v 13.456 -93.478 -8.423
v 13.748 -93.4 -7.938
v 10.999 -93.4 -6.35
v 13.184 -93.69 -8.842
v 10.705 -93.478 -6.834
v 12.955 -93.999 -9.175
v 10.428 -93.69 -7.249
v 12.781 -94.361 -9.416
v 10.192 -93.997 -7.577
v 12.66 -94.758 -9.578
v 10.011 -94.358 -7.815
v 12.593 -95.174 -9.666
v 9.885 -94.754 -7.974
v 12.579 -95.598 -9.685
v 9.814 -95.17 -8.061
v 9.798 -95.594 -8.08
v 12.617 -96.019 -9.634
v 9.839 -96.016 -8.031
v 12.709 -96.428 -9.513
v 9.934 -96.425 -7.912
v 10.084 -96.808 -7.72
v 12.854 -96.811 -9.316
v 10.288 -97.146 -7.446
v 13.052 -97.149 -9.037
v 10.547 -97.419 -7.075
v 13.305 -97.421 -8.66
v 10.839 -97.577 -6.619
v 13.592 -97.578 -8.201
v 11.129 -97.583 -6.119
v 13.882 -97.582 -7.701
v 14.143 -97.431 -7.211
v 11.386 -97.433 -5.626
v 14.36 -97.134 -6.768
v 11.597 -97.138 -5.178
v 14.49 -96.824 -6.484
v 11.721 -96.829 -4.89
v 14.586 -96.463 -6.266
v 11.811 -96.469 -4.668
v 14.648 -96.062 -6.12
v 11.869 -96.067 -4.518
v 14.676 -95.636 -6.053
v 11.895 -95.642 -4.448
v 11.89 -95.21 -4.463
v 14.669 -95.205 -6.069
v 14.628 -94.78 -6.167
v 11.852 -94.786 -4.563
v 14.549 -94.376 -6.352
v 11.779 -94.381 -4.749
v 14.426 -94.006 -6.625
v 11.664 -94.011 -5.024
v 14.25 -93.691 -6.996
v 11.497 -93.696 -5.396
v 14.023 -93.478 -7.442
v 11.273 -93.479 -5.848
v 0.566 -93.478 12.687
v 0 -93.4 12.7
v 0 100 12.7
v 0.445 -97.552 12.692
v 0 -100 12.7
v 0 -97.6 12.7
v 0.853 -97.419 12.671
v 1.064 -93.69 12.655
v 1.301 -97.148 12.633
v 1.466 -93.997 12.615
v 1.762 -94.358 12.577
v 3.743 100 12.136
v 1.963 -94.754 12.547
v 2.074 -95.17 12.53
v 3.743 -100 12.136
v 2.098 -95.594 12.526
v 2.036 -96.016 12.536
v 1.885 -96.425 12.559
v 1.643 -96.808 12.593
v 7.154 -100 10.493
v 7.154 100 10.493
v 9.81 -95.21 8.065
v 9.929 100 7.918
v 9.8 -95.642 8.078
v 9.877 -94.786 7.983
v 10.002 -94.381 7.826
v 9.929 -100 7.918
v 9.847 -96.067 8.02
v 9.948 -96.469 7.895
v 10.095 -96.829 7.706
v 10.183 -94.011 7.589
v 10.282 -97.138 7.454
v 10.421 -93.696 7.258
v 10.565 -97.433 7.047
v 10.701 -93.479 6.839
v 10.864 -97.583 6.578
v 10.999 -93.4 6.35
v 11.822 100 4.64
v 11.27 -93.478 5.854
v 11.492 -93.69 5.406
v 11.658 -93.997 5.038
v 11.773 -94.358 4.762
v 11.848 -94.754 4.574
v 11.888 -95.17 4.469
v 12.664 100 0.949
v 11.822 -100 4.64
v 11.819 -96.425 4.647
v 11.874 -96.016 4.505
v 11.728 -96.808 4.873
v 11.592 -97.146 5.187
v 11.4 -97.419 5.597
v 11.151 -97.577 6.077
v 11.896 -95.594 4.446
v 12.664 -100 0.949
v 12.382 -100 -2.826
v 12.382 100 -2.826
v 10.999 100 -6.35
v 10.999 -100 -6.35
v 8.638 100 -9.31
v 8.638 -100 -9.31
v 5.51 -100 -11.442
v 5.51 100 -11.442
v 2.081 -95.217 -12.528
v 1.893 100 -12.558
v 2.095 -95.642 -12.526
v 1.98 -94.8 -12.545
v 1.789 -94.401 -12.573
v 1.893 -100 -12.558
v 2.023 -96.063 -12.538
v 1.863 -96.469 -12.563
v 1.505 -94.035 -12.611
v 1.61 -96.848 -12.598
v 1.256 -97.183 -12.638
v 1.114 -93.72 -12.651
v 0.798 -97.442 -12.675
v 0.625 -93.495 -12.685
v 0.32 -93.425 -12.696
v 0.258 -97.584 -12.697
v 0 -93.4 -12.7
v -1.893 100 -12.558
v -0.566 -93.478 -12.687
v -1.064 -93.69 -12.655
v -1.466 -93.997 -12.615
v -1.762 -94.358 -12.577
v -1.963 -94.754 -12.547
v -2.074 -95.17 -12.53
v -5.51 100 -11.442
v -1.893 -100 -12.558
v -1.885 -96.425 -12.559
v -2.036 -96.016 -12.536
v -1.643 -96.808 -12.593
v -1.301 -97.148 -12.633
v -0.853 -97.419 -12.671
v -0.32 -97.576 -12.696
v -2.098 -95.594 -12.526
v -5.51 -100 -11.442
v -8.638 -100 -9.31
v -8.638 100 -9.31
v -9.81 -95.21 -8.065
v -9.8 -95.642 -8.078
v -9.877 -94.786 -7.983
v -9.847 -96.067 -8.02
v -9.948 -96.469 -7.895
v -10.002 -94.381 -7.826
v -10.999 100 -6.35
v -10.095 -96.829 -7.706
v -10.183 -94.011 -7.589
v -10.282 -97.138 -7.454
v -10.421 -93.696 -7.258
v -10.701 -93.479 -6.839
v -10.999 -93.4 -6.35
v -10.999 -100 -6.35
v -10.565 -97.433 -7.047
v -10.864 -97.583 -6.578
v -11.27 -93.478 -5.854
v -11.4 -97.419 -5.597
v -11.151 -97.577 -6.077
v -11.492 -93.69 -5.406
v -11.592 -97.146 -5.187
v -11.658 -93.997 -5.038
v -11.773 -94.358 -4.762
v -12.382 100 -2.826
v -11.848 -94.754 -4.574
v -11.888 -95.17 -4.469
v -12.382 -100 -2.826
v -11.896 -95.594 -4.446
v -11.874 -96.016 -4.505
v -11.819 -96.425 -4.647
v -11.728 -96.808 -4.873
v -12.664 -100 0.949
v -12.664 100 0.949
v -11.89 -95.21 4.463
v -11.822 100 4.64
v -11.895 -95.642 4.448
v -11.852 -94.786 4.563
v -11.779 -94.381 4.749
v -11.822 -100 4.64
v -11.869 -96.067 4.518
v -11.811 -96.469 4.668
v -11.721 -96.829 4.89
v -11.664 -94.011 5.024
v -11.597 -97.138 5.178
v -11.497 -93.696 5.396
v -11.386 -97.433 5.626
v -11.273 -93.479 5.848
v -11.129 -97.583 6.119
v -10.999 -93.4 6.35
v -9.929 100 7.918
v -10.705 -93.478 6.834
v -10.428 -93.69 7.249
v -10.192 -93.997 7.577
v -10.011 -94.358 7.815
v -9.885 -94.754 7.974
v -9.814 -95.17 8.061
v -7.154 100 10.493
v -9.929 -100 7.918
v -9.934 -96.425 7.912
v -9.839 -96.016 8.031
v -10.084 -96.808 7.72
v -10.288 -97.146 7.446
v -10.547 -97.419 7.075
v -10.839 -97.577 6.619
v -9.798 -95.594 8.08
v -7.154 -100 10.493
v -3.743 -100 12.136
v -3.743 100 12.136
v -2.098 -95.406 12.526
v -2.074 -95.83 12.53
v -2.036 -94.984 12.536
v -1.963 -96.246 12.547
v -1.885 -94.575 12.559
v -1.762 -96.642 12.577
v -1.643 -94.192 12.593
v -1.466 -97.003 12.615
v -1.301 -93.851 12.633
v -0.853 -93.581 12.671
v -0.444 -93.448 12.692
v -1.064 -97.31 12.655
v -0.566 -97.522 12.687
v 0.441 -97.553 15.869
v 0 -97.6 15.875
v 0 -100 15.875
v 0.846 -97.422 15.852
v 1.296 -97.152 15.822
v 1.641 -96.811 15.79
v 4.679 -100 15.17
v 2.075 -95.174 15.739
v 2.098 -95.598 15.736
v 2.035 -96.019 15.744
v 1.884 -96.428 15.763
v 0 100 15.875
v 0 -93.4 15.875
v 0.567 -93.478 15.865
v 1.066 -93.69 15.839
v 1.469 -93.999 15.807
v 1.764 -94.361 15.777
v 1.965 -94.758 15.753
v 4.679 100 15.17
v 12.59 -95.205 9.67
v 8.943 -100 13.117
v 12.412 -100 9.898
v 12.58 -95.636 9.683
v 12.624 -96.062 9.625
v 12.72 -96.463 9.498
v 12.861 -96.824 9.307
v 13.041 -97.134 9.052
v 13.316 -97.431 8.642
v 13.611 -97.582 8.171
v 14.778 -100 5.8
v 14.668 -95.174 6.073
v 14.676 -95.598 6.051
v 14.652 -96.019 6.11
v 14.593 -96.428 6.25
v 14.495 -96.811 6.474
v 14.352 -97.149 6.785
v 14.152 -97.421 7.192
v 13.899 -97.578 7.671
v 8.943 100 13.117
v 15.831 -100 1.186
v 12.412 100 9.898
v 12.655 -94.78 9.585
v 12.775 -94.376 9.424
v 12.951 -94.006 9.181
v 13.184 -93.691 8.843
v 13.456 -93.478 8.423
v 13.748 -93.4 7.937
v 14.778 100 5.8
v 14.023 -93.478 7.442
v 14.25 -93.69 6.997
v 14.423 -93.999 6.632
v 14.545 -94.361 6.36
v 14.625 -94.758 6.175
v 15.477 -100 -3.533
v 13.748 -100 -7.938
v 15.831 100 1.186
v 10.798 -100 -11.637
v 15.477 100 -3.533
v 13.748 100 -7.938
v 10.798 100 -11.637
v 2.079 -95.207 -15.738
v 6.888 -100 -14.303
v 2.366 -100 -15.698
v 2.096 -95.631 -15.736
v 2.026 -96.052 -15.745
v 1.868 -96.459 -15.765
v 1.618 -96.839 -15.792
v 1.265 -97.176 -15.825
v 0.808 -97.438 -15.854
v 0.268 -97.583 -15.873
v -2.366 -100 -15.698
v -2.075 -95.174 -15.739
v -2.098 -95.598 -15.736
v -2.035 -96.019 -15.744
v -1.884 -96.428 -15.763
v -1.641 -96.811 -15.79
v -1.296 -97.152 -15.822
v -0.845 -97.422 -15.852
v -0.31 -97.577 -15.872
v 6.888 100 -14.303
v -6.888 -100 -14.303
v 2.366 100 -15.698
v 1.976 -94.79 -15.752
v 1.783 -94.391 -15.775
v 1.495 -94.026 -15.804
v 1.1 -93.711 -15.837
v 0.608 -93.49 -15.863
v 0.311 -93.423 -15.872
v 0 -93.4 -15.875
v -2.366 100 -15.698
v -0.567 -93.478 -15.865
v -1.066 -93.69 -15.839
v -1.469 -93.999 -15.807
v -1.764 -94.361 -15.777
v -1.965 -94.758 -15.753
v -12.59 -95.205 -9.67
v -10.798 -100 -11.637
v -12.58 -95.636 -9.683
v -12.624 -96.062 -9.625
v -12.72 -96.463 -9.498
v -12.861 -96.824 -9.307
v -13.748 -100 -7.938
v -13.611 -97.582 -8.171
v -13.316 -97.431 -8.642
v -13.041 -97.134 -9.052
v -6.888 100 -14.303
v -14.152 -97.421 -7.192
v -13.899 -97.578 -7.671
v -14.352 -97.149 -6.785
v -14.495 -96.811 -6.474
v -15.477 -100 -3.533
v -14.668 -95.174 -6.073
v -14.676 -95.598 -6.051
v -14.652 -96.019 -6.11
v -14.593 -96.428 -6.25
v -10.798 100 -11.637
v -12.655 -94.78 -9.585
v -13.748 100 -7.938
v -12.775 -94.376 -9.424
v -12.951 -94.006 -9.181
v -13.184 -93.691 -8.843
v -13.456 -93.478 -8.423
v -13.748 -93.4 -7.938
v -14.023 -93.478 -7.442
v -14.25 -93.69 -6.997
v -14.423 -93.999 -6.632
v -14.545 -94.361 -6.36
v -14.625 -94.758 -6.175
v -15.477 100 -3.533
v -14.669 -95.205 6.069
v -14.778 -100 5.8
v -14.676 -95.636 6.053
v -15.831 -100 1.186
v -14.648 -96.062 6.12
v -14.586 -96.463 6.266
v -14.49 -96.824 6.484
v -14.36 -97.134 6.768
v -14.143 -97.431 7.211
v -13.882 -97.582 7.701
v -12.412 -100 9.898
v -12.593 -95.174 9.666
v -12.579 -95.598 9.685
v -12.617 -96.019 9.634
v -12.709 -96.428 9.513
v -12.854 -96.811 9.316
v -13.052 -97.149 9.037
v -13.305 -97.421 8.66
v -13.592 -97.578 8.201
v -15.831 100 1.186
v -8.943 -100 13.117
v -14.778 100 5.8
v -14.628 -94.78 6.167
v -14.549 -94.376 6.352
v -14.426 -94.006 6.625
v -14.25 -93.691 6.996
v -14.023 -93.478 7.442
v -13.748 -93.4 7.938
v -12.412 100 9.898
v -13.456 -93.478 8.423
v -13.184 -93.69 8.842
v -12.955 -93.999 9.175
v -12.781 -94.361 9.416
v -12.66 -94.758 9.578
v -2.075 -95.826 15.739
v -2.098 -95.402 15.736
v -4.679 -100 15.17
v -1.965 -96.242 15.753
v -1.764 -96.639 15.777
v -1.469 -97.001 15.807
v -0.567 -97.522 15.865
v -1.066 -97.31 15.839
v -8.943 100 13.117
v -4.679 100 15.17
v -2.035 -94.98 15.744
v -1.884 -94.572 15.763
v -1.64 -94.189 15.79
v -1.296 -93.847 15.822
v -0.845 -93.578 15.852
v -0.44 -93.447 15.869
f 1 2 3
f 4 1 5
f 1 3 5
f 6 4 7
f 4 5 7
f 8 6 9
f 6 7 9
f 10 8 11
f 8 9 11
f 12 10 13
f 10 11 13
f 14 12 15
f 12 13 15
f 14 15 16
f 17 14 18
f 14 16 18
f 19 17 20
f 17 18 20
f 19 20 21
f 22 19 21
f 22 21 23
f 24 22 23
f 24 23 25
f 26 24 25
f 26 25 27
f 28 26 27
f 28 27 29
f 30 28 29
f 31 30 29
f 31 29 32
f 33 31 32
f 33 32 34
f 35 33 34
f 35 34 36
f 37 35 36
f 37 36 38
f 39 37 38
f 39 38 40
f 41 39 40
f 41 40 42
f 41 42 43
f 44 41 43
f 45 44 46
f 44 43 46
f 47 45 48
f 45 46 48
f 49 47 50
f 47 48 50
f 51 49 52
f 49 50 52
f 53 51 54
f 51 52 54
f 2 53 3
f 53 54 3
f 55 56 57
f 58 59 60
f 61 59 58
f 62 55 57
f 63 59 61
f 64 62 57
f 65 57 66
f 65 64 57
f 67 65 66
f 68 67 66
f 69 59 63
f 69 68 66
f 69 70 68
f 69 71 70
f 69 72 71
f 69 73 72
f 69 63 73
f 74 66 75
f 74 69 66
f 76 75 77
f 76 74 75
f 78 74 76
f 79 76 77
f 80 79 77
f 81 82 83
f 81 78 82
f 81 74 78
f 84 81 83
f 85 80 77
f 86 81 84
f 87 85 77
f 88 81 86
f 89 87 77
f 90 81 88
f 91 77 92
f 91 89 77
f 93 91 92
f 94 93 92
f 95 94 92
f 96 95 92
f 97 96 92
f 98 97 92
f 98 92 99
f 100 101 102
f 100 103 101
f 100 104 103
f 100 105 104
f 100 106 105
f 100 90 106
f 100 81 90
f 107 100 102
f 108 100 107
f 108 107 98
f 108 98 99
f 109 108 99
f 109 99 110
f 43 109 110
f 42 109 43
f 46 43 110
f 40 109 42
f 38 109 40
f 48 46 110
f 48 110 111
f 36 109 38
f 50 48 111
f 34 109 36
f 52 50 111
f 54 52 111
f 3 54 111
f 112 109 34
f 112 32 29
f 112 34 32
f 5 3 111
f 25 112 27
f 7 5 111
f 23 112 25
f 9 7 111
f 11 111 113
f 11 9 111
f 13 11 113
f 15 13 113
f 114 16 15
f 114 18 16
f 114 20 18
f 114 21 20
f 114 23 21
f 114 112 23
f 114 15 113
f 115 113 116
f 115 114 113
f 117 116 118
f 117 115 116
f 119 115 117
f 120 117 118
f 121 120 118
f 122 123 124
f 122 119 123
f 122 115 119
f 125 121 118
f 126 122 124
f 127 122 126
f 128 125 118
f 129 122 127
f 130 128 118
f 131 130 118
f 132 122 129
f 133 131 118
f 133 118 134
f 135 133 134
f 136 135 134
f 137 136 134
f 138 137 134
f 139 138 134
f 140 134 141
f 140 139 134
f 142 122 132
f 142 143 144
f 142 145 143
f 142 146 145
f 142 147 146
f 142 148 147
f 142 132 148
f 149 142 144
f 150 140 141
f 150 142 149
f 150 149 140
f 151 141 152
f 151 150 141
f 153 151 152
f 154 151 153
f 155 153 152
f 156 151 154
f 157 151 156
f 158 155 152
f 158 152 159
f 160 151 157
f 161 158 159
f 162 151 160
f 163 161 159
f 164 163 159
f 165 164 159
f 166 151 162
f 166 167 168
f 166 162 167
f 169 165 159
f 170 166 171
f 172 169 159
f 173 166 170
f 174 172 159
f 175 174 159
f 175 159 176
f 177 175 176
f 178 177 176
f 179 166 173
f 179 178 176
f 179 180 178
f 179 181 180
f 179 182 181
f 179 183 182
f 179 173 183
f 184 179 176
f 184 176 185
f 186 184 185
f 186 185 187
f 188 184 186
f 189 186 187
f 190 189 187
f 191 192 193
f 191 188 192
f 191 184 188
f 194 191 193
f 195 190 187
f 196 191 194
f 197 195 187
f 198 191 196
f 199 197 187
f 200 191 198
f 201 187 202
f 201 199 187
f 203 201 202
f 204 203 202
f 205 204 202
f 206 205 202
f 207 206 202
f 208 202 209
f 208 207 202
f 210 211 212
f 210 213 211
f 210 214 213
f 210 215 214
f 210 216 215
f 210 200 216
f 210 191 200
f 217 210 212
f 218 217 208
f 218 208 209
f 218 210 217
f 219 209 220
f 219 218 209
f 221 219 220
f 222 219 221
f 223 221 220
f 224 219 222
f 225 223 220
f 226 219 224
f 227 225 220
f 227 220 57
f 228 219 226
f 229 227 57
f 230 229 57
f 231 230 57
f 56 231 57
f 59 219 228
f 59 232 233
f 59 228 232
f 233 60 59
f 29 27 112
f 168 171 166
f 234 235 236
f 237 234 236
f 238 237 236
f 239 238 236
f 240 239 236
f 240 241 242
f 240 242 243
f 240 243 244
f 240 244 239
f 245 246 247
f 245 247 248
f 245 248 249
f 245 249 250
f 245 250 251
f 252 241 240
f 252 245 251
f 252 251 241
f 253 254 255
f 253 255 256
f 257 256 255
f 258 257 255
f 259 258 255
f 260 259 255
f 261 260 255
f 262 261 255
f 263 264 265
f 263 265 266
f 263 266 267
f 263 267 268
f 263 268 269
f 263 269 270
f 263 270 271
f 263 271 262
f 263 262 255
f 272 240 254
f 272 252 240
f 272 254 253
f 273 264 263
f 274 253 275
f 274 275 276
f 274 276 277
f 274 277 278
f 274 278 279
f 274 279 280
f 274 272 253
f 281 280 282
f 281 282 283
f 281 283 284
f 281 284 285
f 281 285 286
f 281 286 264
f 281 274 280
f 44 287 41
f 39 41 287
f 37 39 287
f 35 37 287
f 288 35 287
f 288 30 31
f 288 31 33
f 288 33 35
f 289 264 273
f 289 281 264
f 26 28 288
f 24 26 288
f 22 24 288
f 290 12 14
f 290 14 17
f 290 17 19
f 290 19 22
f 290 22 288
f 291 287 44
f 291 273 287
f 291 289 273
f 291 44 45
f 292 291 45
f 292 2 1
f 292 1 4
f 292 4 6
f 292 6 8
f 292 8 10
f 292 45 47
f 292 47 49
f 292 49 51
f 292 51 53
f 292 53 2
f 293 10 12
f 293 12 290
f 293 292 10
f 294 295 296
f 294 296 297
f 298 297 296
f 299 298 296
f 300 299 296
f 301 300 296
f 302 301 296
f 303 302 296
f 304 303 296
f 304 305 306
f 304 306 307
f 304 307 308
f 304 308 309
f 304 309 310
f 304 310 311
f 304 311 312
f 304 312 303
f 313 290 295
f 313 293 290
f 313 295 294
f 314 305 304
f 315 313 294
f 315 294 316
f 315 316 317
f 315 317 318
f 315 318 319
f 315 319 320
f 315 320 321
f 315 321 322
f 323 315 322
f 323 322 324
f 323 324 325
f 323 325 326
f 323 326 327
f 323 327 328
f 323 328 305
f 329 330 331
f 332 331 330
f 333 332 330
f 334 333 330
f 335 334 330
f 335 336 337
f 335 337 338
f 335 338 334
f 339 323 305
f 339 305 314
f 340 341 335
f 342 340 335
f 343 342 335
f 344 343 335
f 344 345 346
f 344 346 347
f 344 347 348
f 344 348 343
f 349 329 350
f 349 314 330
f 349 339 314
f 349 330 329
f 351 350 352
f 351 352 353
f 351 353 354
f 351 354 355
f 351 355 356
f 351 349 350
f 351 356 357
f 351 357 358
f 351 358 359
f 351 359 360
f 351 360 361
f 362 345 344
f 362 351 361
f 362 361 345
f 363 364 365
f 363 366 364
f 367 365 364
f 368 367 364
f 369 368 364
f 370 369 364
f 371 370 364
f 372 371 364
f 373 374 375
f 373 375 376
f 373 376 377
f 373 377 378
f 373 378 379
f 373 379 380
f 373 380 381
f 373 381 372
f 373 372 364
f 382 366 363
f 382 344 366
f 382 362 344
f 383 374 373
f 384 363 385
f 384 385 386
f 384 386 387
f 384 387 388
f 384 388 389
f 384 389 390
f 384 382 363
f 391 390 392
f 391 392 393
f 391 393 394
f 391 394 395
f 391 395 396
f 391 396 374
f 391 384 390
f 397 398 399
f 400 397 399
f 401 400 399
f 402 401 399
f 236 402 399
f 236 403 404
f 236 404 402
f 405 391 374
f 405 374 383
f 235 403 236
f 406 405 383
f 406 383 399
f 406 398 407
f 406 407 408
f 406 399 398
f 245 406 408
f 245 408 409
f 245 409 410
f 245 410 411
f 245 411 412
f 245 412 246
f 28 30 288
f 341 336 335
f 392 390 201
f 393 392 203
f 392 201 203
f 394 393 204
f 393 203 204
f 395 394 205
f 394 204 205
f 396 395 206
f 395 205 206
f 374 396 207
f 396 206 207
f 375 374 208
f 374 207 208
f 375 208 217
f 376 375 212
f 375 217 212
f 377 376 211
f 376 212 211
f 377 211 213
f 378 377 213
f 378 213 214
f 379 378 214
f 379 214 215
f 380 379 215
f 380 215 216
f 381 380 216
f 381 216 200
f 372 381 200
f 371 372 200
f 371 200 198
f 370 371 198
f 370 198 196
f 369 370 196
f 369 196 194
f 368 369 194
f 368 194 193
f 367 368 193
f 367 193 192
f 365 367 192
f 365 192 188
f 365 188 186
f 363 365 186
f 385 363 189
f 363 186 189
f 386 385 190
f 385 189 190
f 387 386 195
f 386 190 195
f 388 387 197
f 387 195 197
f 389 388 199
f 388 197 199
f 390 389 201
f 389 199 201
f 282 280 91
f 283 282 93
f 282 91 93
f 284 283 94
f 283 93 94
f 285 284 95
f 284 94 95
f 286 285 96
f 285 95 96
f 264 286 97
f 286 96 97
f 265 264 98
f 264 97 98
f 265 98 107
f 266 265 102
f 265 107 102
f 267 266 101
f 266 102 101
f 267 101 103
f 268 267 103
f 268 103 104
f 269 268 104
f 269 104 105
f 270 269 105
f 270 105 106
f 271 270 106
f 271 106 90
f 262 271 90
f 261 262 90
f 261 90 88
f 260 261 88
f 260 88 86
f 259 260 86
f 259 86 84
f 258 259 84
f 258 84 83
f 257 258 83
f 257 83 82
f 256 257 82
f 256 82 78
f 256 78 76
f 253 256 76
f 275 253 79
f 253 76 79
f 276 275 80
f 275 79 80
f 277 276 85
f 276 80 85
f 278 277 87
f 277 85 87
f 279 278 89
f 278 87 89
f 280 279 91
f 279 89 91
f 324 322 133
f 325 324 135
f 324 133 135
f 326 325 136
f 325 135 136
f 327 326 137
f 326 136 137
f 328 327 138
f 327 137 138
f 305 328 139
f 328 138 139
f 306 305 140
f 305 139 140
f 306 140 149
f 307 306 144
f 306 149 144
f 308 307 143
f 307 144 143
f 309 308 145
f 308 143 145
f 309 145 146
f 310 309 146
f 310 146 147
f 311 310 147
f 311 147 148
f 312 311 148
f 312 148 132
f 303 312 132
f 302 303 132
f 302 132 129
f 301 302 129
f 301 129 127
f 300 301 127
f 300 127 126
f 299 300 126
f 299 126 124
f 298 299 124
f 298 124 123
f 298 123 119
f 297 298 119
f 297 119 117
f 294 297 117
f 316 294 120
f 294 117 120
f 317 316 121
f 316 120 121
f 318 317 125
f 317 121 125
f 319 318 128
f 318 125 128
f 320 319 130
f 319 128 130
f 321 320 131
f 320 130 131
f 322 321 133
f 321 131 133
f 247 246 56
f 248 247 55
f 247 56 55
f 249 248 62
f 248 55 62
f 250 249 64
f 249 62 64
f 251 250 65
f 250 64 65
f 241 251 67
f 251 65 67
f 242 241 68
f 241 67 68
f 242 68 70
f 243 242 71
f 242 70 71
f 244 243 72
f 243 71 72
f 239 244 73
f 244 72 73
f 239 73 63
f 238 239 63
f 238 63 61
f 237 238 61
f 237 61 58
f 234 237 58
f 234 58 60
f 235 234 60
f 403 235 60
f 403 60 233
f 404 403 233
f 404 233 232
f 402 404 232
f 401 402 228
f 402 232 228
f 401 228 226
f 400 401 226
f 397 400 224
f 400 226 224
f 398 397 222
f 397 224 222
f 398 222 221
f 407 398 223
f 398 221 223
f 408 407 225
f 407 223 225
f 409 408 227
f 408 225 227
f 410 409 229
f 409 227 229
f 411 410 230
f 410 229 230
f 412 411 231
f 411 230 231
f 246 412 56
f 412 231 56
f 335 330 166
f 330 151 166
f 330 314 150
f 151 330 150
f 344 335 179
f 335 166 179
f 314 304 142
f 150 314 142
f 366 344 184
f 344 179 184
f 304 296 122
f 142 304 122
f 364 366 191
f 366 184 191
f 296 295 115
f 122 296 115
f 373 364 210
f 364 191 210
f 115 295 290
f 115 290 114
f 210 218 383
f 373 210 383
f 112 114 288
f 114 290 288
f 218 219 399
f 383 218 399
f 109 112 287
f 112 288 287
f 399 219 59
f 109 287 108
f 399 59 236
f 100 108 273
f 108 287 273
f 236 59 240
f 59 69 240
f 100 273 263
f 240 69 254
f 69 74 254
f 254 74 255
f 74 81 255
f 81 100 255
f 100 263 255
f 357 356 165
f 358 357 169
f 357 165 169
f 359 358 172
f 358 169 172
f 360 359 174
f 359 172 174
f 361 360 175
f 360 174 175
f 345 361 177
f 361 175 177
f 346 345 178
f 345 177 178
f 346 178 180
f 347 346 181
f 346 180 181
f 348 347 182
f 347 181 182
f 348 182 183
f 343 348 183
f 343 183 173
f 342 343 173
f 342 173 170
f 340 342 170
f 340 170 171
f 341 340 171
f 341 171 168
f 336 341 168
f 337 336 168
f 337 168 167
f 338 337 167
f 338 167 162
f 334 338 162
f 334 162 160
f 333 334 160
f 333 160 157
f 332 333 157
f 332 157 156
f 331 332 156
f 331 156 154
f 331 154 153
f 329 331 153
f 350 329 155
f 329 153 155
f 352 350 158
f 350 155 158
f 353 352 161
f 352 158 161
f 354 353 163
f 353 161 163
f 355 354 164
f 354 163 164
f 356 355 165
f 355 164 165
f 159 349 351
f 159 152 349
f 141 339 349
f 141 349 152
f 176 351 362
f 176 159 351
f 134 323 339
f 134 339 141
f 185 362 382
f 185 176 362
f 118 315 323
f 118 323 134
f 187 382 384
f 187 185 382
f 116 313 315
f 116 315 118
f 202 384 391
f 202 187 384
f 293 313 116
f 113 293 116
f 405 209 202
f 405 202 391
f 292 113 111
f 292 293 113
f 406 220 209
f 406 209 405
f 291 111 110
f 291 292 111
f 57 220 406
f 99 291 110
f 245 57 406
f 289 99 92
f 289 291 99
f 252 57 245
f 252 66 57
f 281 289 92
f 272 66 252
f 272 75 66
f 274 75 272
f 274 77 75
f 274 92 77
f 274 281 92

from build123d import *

# Parameters (mm, degrees)
SKETCH1_R           = 15.875
SKETCH1_R_2         = 12.7
BOSS_EXTRUDE1_DEPTH = 100
SKETCH2_R           = 2.1
CUT_EXTRUDE1_DEPTH  = 103.489176258
CIRPATTERN1_COUNT   = 6


with BuildPart() as part:
    # Sketch1 → Boss-Extrude1 (new, symmetric)
    with BuildSketch(Plane(origin=(0, 0, 0), x_dir=(1, 0, 0), z_dir=(0, 1, 0))):
        with Locations(Location((0, 0, 0), (0, 0, 270))):
            Circle(SKETCH1_R)
        with Locations(Location((0, 0, 0), (0, 0, 270))):
            Circle(SKETCH1_R_2, mode=Mode.SUBTRACT)
    extrude(amount=BOSS_EXTRUDE1_DEPTH, both=True)

    # Sketch2 → Cut-Extrude1 (cut, through all)
    with BuildSketch(Plane.XY):
        with Locations(Location((0, -95.5, 0), (0, 0, 90))):
            Circle(SKETCH2_R)
    cut_extrude1 = extrude(amount=-CUT_EXTRUDE1_DEPTH, mode=Mode.SUBTRACT)

    # CirPattern1: Cut-Extrude1 ×6 about axis
    cirpattern1_axis = Axis((0, 100, 0), (0, -1, 0))
    for i in range(1, CIRPATTERN1_COUNT):
        add(cut_extrude1.rotate(cirpattern1_axis, i * 360 / CIRPATTERN1_COUNT), mode=Mode.SUBTRACT)


solid = part.part
